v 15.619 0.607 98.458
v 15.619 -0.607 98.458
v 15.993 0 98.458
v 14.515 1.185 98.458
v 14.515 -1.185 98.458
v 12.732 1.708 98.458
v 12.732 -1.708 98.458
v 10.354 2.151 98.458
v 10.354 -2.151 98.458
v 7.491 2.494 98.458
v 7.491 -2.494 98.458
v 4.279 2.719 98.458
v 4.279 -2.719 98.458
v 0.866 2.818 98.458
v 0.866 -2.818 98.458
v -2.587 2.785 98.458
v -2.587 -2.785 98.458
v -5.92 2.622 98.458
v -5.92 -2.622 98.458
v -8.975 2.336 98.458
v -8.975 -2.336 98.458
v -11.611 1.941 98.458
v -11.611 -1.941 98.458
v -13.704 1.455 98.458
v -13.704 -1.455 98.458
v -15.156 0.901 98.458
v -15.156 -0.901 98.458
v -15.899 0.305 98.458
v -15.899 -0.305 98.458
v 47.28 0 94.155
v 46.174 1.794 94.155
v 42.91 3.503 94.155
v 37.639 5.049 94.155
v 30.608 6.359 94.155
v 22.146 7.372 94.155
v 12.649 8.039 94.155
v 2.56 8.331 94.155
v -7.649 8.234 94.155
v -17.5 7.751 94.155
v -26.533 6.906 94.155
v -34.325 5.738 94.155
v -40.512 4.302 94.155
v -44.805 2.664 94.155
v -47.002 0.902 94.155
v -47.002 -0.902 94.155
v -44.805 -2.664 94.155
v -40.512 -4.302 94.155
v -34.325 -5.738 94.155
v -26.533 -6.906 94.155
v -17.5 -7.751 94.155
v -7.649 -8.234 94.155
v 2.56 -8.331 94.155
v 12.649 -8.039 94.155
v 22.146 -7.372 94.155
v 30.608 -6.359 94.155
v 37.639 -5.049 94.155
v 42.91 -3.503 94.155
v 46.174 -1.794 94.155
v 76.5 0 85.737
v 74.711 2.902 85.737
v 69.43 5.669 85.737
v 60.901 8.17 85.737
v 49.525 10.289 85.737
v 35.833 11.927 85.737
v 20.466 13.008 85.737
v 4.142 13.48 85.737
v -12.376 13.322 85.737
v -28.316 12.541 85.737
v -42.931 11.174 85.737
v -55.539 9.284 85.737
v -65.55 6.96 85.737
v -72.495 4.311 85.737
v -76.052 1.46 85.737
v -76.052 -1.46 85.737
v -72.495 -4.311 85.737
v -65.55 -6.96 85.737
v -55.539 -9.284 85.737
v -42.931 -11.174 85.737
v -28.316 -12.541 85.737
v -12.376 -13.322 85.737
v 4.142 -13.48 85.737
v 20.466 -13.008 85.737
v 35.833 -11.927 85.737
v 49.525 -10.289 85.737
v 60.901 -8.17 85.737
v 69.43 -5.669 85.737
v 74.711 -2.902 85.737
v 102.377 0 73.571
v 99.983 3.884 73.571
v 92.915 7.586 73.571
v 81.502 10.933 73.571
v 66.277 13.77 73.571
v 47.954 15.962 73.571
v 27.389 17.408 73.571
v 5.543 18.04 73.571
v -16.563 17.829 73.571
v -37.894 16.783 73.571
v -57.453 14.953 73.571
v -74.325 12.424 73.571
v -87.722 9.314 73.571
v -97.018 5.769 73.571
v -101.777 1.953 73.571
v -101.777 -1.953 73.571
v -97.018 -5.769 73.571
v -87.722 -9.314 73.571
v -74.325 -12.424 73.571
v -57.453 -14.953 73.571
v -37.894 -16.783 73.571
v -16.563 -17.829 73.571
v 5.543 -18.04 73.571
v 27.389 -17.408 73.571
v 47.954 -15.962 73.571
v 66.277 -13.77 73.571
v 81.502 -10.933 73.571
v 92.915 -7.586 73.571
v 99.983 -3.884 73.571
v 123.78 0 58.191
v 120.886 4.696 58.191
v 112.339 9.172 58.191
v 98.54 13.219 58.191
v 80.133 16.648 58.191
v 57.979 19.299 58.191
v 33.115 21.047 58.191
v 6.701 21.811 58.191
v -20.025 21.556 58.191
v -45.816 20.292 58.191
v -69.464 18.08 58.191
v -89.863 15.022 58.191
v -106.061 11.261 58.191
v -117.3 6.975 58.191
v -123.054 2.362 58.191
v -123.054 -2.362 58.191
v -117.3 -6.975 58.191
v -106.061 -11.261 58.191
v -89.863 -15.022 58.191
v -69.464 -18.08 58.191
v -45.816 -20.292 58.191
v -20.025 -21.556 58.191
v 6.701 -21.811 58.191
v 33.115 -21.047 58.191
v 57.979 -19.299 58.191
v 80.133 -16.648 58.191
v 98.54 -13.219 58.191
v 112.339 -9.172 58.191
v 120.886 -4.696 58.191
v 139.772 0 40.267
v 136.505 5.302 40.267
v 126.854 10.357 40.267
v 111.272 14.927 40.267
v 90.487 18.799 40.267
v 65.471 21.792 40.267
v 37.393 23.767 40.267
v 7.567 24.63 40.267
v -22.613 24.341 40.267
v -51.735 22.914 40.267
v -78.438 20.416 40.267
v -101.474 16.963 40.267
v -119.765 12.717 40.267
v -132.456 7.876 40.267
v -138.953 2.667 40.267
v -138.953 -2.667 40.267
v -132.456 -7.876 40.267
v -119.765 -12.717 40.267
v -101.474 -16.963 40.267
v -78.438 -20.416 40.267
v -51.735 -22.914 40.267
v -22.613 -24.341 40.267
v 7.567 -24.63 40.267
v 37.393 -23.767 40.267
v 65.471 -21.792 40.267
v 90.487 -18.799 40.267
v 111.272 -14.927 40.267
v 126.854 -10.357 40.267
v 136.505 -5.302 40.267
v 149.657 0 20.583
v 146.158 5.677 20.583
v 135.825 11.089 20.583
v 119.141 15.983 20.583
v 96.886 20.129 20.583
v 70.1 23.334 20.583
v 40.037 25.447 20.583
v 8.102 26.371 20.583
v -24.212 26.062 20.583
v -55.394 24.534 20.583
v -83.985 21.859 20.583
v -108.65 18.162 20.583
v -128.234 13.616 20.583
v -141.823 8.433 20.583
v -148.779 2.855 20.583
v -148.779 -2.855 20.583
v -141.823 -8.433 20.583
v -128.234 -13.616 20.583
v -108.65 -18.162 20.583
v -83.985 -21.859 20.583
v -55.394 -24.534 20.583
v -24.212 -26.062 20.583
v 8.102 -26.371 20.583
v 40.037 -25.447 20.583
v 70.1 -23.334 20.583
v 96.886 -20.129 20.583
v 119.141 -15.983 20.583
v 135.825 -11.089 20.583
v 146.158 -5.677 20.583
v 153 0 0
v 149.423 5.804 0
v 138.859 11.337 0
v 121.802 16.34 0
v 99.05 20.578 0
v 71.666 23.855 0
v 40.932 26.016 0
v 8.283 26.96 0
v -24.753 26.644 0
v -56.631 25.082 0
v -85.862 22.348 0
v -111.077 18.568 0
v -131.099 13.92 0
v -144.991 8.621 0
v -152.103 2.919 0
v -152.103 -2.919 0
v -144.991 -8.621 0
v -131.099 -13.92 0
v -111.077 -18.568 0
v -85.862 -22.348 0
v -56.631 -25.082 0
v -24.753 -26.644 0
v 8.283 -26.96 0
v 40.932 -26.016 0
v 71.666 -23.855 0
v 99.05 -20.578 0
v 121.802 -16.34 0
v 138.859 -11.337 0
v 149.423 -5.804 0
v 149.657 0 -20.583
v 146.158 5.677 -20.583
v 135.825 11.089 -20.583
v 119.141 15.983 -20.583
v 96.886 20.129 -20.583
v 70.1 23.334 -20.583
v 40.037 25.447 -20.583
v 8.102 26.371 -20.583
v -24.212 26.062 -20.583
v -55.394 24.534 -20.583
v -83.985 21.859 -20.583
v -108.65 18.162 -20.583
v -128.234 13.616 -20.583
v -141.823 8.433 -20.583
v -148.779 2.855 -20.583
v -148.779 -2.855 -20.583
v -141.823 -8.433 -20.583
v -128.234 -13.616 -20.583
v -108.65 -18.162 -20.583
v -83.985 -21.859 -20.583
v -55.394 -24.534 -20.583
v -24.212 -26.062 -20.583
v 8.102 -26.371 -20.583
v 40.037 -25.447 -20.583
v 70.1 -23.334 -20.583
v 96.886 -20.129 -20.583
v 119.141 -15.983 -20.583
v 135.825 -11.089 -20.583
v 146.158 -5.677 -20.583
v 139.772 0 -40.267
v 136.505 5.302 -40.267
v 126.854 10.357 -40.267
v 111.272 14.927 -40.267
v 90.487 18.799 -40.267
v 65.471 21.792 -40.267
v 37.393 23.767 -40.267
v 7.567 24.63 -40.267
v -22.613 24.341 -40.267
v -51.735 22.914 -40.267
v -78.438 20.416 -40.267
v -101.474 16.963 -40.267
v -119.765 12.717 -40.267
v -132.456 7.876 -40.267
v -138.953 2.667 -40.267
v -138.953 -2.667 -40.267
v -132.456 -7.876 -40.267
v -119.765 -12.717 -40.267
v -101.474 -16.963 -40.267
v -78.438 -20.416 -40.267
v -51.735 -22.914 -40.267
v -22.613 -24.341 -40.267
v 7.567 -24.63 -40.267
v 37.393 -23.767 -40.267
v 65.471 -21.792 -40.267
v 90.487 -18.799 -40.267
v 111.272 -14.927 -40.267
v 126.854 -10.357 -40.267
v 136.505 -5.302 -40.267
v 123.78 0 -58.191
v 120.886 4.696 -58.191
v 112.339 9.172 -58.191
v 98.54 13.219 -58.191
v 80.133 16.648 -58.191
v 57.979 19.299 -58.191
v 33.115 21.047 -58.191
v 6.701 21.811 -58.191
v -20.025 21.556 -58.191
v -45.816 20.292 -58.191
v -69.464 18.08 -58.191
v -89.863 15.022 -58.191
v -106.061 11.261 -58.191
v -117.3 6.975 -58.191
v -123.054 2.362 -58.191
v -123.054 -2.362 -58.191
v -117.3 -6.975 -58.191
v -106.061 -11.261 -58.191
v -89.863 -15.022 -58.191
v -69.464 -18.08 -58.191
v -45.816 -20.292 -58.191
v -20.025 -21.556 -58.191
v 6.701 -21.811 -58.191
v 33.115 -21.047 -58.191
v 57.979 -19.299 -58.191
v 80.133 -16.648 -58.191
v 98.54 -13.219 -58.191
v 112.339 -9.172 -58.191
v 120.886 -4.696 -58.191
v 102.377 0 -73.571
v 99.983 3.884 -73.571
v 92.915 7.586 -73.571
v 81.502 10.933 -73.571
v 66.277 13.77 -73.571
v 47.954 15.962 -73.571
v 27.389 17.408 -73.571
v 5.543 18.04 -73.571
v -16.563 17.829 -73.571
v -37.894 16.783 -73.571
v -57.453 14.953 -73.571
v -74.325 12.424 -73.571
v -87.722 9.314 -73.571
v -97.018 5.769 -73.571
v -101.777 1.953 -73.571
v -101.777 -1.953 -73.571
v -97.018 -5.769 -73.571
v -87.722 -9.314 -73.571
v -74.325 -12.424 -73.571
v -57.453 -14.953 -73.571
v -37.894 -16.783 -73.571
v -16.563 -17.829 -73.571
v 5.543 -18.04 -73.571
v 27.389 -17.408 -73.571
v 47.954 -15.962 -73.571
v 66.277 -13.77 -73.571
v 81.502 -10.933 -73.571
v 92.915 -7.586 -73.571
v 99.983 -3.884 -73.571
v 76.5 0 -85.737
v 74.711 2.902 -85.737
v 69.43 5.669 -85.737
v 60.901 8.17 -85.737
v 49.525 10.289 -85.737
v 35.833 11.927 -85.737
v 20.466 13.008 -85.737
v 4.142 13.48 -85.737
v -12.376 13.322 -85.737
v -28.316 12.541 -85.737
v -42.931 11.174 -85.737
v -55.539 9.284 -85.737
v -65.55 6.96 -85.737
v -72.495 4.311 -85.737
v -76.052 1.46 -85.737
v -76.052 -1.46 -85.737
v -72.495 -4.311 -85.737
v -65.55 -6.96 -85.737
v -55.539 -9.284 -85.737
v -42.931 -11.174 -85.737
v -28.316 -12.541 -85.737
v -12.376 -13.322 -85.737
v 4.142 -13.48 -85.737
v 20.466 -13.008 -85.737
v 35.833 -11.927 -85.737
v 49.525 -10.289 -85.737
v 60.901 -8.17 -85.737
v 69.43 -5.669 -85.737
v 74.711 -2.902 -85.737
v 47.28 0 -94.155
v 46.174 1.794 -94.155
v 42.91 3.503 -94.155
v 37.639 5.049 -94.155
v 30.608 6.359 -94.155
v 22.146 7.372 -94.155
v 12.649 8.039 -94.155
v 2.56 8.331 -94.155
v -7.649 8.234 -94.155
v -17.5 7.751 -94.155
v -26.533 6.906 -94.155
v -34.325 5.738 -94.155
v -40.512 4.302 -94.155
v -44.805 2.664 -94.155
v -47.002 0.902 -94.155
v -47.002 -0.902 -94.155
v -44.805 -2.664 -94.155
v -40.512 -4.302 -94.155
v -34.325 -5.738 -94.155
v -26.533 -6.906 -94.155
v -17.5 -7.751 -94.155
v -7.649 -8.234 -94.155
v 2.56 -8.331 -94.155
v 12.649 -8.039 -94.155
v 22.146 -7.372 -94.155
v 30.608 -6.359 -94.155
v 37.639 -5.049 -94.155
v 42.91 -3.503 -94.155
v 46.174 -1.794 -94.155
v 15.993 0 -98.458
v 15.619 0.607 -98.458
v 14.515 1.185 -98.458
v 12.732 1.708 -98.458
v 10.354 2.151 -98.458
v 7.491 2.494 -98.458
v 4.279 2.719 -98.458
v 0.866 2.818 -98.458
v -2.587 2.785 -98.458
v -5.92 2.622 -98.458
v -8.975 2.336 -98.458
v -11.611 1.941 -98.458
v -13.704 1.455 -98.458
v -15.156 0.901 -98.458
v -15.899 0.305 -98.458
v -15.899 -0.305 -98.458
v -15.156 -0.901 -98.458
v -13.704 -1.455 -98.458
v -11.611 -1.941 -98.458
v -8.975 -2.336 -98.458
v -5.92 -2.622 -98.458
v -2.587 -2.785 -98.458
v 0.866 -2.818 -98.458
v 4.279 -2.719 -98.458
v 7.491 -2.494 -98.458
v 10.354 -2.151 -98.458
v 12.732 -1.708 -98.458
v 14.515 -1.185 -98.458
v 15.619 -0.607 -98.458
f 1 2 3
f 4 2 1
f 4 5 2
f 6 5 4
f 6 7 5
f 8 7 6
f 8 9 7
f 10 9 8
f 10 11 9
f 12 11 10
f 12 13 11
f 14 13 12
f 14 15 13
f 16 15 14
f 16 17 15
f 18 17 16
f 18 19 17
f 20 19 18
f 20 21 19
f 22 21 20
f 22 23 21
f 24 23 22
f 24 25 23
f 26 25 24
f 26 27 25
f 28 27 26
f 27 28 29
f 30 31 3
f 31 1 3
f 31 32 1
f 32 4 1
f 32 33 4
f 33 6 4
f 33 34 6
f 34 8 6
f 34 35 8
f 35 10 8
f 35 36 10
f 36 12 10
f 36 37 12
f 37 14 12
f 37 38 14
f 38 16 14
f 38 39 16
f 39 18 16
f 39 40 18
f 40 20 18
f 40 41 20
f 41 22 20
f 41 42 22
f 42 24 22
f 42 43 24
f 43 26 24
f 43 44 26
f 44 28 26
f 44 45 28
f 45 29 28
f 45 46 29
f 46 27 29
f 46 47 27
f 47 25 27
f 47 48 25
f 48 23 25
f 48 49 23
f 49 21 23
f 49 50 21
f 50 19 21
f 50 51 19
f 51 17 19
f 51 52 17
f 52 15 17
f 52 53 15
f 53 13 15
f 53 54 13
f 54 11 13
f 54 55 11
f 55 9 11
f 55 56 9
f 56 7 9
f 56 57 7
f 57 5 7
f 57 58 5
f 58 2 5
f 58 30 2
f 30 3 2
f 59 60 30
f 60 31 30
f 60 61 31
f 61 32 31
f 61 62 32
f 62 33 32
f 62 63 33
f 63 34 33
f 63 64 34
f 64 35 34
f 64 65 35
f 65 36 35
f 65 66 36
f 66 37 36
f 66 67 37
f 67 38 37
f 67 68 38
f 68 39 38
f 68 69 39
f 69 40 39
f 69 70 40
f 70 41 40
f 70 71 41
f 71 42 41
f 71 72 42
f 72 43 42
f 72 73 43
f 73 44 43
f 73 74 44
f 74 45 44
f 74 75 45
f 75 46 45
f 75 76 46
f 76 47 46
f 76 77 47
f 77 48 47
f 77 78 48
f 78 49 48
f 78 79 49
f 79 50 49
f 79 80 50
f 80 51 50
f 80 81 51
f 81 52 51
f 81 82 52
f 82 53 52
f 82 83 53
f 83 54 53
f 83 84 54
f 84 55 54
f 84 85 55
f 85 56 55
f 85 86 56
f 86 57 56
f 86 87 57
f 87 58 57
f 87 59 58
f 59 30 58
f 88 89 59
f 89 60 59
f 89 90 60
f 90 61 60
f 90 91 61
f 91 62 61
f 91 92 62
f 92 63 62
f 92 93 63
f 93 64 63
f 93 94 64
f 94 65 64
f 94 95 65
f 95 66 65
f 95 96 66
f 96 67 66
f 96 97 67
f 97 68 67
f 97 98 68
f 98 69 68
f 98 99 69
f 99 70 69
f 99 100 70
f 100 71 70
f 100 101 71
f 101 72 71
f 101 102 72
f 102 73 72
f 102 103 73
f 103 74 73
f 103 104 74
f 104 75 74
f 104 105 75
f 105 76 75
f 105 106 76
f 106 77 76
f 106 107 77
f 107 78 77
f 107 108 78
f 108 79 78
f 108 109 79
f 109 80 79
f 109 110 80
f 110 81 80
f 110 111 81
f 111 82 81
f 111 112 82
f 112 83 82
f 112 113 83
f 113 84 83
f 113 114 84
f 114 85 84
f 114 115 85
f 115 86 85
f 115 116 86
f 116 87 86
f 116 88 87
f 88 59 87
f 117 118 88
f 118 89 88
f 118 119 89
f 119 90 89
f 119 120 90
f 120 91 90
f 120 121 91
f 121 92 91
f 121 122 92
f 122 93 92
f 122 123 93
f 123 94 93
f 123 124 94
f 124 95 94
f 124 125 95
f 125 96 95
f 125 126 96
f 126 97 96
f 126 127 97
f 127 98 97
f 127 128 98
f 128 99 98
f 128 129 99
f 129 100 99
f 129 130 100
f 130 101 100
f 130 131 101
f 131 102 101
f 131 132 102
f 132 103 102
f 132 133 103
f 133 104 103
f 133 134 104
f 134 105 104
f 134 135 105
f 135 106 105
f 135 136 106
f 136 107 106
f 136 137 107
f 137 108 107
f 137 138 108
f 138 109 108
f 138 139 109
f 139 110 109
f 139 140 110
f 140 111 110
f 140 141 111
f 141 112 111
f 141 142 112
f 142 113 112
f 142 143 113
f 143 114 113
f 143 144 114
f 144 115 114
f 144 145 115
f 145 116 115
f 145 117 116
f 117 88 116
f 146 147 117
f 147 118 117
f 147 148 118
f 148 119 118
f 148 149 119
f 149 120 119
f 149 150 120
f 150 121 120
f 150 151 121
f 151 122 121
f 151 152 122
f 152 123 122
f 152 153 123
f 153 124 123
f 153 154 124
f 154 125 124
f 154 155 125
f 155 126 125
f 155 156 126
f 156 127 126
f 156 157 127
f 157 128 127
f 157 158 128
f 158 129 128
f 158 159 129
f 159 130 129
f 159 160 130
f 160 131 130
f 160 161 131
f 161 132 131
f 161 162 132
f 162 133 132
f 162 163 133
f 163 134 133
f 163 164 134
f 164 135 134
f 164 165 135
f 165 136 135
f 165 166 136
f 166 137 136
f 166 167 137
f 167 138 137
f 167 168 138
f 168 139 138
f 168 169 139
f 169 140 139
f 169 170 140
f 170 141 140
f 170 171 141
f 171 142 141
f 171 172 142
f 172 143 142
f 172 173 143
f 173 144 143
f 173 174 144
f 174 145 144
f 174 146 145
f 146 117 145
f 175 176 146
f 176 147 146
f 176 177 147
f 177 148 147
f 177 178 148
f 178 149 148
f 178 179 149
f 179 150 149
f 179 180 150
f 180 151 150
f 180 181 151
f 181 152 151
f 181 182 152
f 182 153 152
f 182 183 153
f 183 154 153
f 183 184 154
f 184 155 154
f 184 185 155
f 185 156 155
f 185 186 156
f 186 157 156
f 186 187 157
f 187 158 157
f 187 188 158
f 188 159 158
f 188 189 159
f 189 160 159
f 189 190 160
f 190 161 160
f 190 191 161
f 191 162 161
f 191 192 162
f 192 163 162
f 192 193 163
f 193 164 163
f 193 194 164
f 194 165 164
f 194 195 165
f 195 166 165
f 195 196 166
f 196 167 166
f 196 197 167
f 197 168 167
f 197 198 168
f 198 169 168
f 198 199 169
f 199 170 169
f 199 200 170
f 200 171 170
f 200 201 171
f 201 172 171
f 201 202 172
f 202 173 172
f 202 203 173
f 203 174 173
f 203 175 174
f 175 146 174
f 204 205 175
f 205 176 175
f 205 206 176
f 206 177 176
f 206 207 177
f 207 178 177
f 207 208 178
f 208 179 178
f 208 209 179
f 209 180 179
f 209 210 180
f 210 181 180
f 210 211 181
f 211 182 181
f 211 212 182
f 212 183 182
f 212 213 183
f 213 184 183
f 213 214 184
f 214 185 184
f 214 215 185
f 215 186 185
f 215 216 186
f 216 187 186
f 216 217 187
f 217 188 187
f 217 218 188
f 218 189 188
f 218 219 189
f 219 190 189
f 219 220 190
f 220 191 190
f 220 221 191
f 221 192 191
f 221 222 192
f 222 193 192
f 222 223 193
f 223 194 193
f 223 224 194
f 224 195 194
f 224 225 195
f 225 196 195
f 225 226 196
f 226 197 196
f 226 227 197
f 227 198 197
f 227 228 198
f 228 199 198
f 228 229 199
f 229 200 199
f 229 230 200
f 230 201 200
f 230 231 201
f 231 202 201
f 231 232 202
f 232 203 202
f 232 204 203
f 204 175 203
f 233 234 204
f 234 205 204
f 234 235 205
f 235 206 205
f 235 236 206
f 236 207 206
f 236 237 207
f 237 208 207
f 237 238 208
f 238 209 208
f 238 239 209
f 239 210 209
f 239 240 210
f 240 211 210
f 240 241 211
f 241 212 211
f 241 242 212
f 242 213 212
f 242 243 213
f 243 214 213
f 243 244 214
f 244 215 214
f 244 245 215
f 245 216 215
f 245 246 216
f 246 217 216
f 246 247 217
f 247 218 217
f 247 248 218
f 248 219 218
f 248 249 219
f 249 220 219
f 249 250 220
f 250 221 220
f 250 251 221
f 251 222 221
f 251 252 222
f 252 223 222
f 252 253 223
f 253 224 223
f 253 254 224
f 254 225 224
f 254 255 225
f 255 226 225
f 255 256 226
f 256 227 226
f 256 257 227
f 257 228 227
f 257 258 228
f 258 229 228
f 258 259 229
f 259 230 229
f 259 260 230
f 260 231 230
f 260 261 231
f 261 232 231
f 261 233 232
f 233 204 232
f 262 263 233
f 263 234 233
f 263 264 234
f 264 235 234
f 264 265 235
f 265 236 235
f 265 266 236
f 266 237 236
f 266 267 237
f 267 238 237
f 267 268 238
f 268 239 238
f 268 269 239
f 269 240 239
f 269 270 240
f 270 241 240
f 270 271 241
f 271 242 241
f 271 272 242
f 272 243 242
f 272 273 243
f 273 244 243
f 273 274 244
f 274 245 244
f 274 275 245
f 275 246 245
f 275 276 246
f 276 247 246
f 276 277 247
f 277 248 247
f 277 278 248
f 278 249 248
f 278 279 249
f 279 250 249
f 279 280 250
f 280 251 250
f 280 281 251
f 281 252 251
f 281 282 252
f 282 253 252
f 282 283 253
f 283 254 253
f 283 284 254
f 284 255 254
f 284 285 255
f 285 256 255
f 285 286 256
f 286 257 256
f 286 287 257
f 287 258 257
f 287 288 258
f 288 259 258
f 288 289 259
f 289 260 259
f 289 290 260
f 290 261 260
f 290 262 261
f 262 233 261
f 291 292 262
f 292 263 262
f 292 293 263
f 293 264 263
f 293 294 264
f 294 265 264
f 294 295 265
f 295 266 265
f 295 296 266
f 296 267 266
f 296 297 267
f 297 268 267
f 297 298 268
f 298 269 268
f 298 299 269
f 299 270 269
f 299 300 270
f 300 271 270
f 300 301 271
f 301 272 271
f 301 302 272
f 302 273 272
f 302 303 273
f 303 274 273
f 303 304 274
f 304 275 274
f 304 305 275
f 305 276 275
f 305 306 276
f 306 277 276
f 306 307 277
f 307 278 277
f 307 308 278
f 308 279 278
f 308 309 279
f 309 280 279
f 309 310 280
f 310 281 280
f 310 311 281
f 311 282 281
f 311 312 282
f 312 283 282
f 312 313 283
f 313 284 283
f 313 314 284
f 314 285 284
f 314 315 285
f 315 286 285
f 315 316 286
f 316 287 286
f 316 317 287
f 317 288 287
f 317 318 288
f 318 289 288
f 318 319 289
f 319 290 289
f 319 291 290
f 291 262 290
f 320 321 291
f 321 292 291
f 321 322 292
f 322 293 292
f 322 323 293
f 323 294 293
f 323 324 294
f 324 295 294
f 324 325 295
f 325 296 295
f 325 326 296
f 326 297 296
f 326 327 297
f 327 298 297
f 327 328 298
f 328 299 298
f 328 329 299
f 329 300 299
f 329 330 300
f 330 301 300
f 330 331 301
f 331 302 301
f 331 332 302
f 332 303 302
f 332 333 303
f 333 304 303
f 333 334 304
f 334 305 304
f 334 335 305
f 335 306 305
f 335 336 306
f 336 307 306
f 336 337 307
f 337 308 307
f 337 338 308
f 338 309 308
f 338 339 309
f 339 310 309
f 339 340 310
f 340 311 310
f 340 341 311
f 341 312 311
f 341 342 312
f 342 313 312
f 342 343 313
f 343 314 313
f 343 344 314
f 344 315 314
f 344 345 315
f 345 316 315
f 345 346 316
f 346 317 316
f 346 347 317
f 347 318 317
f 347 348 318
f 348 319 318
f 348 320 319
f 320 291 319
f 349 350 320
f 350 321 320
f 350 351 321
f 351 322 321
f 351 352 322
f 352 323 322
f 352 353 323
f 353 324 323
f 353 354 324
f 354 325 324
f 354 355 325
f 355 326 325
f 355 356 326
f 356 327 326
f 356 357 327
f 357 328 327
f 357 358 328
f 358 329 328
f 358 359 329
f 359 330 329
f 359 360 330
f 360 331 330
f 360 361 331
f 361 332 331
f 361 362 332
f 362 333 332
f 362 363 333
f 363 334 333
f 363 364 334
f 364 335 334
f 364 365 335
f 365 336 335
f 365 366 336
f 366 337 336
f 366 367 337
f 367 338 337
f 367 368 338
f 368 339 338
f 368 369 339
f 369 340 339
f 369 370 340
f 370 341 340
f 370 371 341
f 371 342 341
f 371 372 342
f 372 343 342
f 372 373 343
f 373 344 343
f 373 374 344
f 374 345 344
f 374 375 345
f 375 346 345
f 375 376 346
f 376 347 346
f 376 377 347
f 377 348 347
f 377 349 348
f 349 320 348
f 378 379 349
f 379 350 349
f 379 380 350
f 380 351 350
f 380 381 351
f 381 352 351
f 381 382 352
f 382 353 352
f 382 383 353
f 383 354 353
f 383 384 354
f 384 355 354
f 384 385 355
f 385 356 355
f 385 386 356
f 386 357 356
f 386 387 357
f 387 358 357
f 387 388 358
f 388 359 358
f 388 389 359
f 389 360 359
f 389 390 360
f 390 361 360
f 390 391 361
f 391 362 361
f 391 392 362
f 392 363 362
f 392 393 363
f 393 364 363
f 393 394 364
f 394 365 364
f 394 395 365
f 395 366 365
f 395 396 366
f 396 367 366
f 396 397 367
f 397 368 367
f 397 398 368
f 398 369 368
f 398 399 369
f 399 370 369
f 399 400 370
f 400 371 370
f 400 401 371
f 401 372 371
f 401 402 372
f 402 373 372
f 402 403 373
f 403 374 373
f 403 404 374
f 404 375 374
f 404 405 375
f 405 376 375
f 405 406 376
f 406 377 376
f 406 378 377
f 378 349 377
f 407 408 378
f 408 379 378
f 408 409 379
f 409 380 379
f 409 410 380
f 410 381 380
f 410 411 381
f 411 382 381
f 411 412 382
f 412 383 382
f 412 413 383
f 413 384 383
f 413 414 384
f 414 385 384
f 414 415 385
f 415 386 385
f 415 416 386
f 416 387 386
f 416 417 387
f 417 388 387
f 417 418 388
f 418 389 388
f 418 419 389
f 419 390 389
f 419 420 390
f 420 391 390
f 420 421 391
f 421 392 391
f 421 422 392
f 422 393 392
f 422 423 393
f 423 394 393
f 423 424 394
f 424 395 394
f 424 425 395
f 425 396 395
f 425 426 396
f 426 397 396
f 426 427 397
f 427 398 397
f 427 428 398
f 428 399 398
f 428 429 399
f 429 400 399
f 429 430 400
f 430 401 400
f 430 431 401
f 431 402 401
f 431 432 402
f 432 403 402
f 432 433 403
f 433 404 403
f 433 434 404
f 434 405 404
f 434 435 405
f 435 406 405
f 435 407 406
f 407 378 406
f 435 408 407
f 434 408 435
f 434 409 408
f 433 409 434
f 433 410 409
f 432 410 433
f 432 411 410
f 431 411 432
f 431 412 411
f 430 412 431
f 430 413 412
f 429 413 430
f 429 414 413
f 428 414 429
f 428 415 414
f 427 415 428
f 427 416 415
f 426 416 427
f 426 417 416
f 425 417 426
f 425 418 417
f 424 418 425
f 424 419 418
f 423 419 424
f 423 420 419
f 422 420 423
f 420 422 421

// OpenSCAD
// Generated by SolidPython 1.0.1 on 2020-07-29 00:46:52


scale(v = [17, 3, 11]) {
	sphere(r = 9);
}
/***********************************************
*********      SolidPython code:      **********
************************************************
 
# import packages: SolidPython
from solid import *
from solid.utils import *
from itertools import chain, combinations, permutations


class Resize:

    def __init__(self, scad_file):
        self.scad_file = scad_file
        #self.scad_file = import_scad(scad_file)
        # cone/cylinder param:
        self.r1 = 0
        self.r2 = 0
        self.h = 0
        # rectangular prism param:
        self.w = 0
        self.l = 0
        # ellipse param:
        self.r = 0

    # import OpenScad code (file name corresponds to shape)


    # classify shape + parameters
    def assign(self, param1, param2, param3):
        if self.scad_file == 'cone.scad':
            self.r1 = param1
            self.r2 = param2
            self.h = param3
        elif self.scad_file == 'cylinder.scad':
            self.r1 = param1
            self.r2 = param2
            self.h = param3
        elif self.scad_file == 'rectangularPrism.scad':
            self.h = param1
            self.l = param2
            self.w = param3
        else:
            self.r = param1
            self.h = param2

    # resize parameters
    def iterate(self):
        x = range(3, 20, 2)
        i = 1
        if self.scad_file == 'cone.scad':
            tempList = list(permutations(x, 2))
            for temp in tempList:
                param1 = temp[0]
                param2 = temp[1]
                filepath = 'produced_scad_files/' + 'cone' + str(param1) + '_' + str(param2) + '_' + '.scad'
                scad_render_to_file(cylinder(h=param1, r1=param2, r2=0), filepath)

        elif self.scad_file == 'cylinder.scad':
            tempList = list(permutations(x, 3))
            for temp in tempList:
                param1 = temp[0]
                param2 = temp[1]
                filepath = 'produced_scad_files/' + 'cylinder' + str(param1) + '_' + str(param2) + '_' + '.scad'
                scad_render_to_file(cylinder(h=param1, r1=param2, r2=param2), filepath)

        elif self.scad_file == 'rectangularPrism.scad':
            tempList = list(permutations(x, 3))
            for temp in tempList:
                param1 = temp[0]
                param2 = temp[1]
                param3 = temp[2]
                filepath = 'produced_scad_files/' + 'rectangularPrism' + str(param1) + '_' + str(param2) + '_' + str(
                    param3) + '.scad'
                scad_render_to_file(cube(size=(param1, param2, param3)), filepath)

        elif self.scad_file == 'ellipse.scad':
            tempList = list(permutations(x, 4))
            for temp in tempList:
                param1 = temp[0]
                param2 = temp[1]
                param3 = temp[2]
                param4 = temp[3]
                filepath = 'produced_scad_files/' + 'ellipse' + str(param1) + '_' + str(param2) + '_' + str(param3) + '_' + str(param4) + '.scad'
                scad_render_to_file(scale([param1, param2, param3])(sphere(r=param4)), filepath)

    def render_to_scadfile(self):
        scad_render_to_file(scad, 'example.scad') 
 
************************************************/
